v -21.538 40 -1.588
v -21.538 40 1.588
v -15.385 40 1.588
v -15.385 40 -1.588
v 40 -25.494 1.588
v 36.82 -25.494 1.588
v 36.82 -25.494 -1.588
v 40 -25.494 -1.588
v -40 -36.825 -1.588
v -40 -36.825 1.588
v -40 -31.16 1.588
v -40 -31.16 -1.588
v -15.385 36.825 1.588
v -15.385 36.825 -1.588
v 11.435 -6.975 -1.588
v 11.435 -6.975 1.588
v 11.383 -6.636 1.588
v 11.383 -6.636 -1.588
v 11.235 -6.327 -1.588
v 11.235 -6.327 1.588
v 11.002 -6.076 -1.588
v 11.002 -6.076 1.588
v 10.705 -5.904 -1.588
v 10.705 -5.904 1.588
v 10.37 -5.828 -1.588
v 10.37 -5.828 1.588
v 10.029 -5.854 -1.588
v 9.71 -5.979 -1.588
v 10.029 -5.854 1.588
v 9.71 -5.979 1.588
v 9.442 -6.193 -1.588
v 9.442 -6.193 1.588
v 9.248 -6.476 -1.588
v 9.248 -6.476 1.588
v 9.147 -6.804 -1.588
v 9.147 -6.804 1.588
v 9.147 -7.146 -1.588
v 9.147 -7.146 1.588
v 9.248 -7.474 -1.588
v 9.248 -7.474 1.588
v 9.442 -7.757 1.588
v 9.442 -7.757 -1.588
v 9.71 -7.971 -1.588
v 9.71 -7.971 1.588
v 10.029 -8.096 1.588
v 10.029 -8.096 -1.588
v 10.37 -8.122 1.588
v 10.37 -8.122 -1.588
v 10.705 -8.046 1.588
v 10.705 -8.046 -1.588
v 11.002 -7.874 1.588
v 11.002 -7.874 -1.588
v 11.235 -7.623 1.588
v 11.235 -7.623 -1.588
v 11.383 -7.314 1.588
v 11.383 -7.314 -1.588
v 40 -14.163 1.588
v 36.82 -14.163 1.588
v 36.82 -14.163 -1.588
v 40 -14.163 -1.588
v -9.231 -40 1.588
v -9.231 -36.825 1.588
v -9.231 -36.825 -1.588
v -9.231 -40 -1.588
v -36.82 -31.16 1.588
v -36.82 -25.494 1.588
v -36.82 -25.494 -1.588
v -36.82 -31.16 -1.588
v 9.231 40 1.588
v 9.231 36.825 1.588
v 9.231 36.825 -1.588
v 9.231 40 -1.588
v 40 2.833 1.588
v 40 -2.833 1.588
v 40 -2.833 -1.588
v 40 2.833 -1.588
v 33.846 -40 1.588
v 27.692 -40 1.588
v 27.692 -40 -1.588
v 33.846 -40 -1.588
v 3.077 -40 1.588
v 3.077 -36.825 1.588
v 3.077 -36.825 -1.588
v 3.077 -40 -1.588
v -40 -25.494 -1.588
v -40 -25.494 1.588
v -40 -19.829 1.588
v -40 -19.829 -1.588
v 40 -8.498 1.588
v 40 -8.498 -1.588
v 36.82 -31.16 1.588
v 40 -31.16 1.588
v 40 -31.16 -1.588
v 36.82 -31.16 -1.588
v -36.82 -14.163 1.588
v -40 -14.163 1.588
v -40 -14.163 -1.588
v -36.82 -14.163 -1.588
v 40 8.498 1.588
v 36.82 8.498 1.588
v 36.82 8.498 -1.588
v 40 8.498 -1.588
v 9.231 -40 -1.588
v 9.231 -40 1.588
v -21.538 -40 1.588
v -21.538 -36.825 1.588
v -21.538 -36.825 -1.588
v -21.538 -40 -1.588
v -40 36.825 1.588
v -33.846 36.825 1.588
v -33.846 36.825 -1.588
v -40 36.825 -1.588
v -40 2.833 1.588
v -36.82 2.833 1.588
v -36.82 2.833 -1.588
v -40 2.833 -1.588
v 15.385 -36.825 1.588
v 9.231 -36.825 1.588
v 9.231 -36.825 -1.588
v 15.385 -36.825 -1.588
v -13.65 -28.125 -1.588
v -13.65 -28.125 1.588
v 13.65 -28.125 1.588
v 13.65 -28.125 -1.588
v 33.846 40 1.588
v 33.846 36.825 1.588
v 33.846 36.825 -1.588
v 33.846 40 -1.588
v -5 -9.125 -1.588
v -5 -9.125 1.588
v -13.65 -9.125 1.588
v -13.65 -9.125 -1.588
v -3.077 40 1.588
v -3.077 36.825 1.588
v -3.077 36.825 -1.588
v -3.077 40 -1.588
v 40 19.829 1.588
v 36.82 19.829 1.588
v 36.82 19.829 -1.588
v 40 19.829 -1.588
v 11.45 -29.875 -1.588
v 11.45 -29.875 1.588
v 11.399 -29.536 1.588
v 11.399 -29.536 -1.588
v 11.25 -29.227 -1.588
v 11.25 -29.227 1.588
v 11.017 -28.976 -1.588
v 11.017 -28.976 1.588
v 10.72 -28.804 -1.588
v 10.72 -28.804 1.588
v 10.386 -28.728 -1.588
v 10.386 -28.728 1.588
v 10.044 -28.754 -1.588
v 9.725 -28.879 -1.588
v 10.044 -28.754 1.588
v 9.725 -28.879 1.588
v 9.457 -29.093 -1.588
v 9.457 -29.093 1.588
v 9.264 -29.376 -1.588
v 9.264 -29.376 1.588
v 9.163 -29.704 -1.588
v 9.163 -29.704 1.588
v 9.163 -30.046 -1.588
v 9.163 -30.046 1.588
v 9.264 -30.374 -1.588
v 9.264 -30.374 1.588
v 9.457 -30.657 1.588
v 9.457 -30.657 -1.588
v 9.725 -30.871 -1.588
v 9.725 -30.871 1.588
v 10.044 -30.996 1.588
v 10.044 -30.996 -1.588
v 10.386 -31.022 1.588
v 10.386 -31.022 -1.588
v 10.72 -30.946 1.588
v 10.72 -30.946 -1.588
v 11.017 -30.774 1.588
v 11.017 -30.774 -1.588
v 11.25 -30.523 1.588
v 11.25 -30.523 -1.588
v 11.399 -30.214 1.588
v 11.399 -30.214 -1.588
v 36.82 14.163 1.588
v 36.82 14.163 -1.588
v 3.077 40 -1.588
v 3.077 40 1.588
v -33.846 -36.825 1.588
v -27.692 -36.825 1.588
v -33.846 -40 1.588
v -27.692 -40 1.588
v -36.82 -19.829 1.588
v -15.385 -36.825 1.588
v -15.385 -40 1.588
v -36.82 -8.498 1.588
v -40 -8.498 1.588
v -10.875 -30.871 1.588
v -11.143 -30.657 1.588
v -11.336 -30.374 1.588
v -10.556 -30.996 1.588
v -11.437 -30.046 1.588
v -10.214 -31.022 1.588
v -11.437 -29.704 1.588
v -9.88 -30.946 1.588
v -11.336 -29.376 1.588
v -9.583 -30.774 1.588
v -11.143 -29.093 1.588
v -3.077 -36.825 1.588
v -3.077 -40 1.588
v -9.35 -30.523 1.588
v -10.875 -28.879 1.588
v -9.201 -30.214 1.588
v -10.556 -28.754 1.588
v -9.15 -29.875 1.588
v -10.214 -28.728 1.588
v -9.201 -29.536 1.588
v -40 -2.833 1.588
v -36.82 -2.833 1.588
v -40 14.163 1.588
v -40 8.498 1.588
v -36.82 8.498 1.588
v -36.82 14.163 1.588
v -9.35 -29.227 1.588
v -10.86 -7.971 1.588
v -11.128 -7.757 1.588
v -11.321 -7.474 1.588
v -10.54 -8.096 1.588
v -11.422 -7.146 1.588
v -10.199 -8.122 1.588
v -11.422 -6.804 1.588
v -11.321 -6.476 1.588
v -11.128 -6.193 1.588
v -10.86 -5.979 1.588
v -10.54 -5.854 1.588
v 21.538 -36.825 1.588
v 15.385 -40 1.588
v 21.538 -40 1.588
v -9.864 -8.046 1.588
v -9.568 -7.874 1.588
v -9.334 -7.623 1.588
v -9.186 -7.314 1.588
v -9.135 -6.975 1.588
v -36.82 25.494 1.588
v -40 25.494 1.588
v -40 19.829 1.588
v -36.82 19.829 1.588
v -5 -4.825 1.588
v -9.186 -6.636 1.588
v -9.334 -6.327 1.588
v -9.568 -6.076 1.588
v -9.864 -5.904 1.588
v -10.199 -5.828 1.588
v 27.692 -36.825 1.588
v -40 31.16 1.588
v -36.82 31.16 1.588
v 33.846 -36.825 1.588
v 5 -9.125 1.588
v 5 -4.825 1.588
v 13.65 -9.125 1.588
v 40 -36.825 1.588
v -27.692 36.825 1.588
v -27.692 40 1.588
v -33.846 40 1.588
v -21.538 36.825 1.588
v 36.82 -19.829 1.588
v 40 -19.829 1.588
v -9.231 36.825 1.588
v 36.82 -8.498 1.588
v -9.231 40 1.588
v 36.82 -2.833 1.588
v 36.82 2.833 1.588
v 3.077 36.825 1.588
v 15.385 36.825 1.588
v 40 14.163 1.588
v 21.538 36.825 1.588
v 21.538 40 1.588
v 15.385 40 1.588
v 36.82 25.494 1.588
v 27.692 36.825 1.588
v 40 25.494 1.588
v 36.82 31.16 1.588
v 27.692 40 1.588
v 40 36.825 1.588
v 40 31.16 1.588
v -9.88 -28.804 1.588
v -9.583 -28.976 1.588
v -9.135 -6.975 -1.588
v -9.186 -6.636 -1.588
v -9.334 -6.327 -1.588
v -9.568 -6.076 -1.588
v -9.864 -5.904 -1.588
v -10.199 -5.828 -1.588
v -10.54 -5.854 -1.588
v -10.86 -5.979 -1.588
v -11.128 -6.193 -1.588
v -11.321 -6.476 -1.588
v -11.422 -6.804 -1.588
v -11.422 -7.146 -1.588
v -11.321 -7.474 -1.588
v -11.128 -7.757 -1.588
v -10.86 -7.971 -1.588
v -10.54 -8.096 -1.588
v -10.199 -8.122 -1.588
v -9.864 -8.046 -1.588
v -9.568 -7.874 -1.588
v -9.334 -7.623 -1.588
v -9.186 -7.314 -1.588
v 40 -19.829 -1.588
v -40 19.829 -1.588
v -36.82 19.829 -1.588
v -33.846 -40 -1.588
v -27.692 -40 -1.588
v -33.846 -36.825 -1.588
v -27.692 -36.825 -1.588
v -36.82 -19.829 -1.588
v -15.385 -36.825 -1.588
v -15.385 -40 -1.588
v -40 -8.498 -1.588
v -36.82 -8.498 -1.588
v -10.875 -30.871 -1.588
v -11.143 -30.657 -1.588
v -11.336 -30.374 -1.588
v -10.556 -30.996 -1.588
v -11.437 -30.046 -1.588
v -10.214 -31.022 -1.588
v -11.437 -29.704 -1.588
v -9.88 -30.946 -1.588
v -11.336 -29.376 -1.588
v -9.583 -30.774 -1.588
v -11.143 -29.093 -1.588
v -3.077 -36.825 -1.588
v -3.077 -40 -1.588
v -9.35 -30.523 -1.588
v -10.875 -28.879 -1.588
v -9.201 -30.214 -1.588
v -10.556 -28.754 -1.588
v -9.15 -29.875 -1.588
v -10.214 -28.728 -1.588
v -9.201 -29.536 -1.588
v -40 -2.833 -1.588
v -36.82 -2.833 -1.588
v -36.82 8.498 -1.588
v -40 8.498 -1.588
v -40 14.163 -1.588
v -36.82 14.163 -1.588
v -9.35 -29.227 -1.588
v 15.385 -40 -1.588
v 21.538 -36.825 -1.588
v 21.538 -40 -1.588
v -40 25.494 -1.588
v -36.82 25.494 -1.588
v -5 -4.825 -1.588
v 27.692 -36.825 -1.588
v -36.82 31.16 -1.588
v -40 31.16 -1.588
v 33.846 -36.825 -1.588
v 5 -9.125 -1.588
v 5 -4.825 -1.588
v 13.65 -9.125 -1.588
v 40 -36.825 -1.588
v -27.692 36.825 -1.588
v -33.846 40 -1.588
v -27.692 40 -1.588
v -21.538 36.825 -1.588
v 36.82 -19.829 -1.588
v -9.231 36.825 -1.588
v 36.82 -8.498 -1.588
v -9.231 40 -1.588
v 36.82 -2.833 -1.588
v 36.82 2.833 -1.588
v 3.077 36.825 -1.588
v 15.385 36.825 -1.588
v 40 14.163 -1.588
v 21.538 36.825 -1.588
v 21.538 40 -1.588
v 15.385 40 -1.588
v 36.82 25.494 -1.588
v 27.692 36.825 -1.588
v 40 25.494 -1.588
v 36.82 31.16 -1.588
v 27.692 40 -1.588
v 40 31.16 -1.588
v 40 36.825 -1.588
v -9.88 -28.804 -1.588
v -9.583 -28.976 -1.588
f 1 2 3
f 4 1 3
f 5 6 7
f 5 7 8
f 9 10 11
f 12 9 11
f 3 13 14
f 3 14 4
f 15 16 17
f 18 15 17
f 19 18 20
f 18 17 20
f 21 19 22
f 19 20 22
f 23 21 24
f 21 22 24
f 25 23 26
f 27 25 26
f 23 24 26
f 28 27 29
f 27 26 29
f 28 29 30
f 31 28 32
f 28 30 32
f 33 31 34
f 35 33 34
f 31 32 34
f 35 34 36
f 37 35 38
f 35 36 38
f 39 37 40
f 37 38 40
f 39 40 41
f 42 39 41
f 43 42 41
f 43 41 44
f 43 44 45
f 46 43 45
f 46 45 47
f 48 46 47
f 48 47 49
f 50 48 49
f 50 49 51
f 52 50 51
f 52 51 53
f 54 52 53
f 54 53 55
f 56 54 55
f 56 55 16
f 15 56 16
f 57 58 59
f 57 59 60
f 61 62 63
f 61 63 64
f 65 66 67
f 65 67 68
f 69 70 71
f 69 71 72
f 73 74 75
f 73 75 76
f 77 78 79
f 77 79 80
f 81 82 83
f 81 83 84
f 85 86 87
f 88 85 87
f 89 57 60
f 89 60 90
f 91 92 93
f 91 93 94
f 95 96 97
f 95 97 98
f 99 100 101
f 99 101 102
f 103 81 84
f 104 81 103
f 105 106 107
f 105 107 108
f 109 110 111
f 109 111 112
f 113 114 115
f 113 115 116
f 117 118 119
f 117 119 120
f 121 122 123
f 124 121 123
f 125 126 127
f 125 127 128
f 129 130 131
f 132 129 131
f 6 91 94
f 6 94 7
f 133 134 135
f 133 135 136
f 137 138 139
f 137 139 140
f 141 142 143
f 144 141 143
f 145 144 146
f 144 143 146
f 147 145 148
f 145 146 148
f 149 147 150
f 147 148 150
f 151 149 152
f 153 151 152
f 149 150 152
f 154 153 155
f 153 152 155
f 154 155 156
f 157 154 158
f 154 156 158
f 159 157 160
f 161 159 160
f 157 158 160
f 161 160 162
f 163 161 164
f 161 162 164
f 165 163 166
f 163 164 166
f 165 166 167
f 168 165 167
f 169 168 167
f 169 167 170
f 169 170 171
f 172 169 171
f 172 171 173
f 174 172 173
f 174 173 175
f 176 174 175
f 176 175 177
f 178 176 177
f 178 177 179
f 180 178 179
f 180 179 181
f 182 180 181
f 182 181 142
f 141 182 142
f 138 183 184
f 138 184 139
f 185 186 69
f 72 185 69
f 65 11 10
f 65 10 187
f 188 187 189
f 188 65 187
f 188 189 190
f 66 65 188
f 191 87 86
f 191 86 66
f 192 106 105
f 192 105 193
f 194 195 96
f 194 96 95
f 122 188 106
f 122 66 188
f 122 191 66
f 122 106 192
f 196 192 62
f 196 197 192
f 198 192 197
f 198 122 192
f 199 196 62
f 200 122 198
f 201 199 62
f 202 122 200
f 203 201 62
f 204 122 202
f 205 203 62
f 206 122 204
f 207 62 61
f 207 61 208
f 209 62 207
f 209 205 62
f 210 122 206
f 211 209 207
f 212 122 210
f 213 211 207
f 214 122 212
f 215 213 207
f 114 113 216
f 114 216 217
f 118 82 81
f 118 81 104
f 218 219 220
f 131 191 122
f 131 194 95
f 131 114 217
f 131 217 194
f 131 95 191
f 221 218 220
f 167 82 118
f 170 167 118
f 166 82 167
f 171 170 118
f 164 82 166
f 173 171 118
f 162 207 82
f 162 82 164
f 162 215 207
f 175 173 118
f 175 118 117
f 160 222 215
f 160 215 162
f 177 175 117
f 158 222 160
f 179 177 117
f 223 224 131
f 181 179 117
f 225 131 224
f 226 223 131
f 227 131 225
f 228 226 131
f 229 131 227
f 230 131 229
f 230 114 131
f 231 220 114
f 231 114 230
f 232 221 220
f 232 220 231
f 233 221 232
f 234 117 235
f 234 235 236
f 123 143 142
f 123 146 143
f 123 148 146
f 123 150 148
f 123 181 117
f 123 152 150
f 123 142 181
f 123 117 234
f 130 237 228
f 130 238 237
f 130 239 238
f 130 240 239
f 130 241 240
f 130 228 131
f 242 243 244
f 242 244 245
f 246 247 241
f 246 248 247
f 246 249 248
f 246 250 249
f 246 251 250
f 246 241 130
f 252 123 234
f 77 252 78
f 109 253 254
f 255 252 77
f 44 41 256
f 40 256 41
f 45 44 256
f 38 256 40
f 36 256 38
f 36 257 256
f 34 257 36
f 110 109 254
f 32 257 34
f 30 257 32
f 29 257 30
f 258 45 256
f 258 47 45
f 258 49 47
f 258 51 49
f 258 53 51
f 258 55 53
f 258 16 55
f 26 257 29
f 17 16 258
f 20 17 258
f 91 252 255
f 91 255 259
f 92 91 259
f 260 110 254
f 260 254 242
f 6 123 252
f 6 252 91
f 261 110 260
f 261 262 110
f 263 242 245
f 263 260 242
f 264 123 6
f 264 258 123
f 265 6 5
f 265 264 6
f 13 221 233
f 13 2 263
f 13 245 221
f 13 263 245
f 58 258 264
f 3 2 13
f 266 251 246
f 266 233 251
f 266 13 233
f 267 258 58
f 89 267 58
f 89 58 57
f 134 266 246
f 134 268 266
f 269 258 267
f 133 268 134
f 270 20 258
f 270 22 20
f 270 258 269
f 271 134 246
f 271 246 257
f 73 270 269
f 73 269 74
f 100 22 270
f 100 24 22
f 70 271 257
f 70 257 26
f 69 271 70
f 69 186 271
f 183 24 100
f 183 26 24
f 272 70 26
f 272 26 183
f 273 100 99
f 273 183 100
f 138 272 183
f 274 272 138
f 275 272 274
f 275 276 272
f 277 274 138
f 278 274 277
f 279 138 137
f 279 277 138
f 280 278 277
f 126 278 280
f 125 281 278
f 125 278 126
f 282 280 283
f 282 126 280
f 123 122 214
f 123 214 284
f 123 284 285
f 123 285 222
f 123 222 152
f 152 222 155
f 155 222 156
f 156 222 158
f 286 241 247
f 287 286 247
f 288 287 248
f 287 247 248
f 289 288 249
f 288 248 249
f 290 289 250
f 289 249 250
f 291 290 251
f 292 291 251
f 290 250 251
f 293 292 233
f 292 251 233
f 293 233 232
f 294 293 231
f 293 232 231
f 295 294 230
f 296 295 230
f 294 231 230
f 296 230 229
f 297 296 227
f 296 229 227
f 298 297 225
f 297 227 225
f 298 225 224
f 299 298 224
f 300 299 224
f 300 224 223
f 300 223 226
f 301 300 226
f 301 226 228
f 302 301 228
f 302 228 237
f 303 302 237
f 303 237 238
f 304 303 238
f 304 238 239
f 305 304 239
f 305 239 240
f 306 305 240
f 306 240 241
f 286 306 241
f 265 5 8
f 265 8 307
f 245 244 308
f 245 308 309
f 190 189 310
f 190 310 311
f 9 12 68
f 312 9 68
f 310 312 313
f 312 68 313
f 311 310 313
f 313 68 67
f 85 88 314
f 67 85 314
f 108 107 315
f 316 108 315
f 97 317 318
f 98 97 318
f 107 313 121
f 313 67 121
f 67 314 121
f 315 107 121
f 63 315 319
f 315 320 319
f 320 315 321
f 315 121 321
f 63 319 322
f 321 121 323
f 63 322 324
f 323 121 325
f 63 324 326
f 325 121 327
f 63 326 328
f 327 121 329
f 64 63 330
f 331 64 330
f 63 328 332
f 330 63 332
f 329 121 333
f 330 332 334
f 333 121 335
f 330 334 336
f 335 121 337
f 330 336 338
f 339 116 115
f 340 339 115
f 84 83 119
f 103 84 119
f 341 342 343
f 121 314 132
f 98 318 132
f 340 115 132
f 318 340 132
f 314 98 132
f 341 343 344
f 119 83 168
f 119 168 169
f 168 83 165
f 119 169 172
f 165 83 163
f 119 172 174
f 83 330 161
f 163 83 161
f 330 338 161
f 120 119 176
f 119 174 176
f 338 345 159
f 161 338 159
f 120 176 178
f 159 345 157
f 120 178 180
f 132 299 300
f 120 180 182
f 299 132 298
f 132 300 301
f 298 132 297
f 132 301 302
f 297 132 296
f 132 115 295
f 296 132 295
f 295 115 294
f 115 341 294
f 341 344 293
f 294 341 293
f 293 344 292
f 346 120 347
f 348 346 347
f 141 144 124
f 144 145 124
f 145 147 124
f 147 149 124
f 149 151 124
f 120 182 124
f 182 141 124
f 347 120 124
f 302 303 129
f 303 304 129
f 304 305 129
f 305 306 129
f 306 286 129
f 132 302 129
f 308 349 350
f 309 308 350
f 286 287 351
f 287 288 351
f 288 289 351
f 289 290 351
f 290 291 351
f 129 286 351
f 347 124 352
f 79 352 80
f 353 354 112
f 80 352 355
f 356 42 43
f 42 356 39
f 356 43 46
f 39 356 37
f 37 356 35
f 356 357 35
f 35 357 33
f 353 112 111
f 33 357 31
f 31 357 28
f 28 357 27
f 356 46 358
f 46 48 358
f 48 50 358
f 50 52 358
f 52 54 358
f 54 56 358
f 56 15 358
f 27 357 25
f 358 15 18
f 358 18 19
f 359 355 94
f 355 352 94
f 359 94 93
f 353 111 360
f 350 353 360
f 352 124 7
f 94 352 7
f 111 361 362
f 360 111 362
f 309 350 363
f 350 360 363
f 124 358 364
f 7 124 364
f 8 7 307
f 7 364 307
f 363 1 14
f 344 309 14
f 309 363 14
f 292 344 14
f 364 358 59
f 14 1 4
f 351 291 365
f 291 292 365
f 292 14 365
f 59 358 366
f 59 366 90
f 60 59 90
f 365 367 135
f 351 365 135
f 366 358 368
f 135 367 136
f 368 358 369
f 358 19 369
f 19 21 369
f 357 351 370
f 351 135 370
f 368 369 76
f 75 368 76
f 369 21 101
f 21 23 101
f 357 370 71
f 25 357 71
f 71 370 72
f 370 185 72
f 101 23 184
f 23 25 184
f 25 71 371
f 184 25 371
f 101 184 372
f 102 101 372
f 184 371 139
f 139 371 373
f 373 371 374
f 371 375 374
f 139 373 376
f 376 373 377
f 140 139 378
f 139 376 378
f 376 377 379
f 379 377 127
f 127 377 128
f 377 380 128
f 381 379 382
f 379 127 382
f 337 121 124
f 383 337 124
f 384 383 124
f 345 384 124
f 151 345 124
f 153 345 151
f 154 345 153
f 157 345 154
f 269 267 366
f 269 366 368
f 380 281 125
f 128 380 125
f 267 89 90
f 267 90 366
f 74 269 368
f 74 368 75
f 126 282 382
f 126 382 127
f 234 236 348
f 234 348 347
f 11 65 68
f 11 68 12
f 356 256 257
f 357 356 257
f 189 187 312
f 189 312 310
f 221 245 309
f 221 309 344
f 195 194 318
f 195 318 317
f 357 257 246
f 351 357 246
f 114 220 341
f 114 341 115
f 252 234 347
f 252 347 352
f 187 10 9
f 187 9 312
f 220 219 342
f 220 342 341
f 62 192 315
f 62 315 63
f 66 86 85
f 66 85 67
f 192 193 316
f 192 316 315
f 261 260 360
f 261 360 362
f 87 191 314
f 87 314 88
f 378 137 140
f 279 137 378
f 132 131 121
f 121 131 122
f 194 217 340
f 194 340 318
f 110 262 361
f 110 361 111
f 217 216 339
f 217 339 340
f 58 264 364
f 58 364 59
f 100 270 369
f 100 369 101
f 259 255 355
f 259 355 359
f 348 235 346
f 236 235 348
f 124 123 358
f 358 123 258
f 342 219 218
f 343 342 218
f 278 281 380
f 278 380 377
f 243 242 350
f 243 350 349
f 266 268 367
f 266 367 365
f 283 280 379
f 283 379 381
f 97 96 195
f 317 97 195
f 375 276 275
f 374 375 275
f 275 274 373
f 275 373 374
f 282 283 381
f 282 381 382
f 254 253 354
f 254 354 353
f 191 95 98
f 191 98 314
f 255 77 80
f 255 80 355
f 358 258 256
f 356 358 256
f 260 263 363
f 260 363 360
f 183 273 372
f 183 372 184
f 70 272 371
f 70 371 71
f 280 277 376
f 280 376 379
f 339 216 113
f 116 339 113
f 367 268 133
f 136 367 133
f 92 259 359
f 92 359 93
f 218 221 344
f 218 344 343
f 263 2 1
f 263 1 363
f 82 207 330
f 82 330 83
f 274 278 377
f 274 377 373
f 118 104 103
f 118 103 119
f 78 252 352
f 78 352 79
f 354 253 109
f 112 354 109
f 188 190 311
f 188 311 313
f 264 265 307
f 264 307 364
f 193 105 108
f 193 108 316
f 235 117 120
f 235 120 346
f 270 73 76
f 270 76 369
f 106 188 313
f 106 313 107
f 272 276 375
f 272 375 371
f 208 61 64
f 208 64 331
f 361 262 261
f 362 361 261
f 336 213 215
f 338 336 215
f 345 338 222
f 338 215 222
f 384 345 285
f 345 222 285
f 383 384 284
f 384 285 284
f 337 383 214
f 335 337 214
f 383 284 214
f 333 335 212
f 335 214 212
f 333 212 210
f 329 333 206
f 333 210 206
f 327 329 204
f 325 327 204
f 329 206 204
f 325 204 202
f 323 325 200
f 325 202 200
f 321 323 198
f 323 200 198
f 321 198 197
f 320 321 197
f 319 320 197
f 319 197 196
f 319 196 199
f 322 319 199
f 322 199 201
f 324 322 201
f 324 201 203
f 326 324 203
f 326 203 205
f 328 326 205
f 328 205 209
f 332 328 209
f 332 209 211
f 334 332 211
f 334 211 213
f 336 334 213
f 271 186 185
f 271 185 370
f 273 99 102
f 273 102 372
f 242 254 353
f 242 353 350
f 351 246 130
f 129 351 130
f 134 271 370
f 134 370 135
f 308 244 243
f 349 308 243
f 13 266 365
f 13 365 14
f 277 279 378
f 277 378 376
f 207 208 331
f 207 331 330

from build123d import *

# Parameters (mm, degrees)
SKETCH1_W           = 80
SKETCH1_H           = 80
BOSS_EXTRUDE1_DEPTH = 1.5875
SKETCH2_OUTSIDE_W   = 104.636
SKETCH2_OUTSIDE_H   = 104.636
CUT_EXTRUDE2_DEPTH  = 10
SKETCH3_R           = 1.15
CUT_EXTRUDE3_DEPTH  = 57.657573413


with BuildPart() as part:
    # Sketch1 → Boss-Extrude1 (new, symmetric)
    with BuildSketch(Plane.XY):
        Rectangle(SKETCH1_W, SKETCH1_H)
    extrude(amount=BOSS_EXTRUDE1_DEPTH, both=True)

    # Sketch2 outside → Cut-Extrude2 (cut)
    with BuildSketch(Plane.XY.offset(1.5875)):
        Rectangle(SKETCH2_OUTSIDE_W, SKETCH2_OUTSIDE_H)
        Polygon((33.846153846, -36.825), (40, -36.825), (40, -31.159615385), (36.82, -31.159615385), (36.82, -25.494230769), (40, -25.494230769), (40, -19.828846154), (36.82, -19.828846154), (36.82, -14.163461538), (40, -14.163461538), (40, -8.498076923), (36.82, -8.498076923), (36.82, -2.832692308), (40, -2.832692308), (40, 2.832692308), (36.82, 2.832692308), (36.82, 8.498076923), (40, 8.498076923), (40, 14.163461538), (36.82, 14.163461538), (36.82, 19.828846154), (40, 19.828846154), (40, 25.494230769), (36.82, 25.494230769), (36.82, 31.159615385), (40, 31.159615385), (40, 36.825), (33.846153846, 36.825), (33.846153846, 40), (27.692307692, 40), (27.692307692, 36.825), (21.538461538, 36.825), (21.538461538, 40), (15.384615385, 40), (15.384615385, 36.825), (9.230769231, 36.825), (9.230769231, 40), (3.076923077, 40), (3.076923077, 36.825), (-3.076923077, 36.825), (-3.076923077, 40), (-9.230769231, 40), (-9.230769231, 36.825), (-15.384615385, 36.825), (-15.384615385, 40), (-21.538461538, 40), (-21.538461538, 36.825), (-27.692307692, 36.825), (-27.692307692, 40), (-33.846153846, 40), (-33.846153846, 36.825), (-40, 36.825), (-40, 31.159615385), (-36.82, 31.159615385), (-36.82, 25.494230769), (-40, 25.494230769), (-40, 19.828846154), (-36.82, 19.828846154), (-36.82, 14.163461538), (-40, 14.163461538), (-40, 8.498076923), (-36.82, 8.498076923), (-36.82, 2.832692308), (-40, 2.832692308), (-40, -2.832692308), (-36.82, -2.832692308), (-36.82, -8.498076923), (-40, -8.498076923), (-40, -14.163461538), (-36.82, -14.163461538), (-36.82, -19.828846154), (-40, -19.828846154), (-40, -25.494230769), (-36.82, -25.494230769), (-36.82, -31.159615385), (-40, -31.159615385), (-40, -36.825), (-33.846153846, -36.825), (-33.846153846, -40), (-27.692307692, -40), (-27.692307692, -36.825), (-21.538461538, -36.825), (-21.538461538, -40), (-15.384615385, -40), (-15.384615385, -36.825), (-9.230769231, -36.825), (-9.230769231, -40), (-3.076923077, -40), (-3.076923077, -36.825), (3.076923077, -36.825), (3.076923077, -40), (9.230769231, -40), (9.230769231, -36.825), (15.384615385, -36.825), (15.384615385, -40), (21.538461538, -40), (21.538461538, -36.825), (27.692307692, -36.825), (27.692307692, -40), (33.846153846, -40), align=None, mode=Mode.SUBTRACT)
    extrude(amount=-CUT_EXTRUDE2_DEPTH, mode=Mode.SUBTRACT)

    # Sketch3 → Cut-Extrude3 (cut, through all)
    with BuildSketch(Plane.XY.offset(1.5875)):
        Polygon((-13.65, -9.125), (-13.65, -28.125), (13.65, -28.125), (13.65, -9.125), (5, -9.125), (5, -4.825), (-5, -4.825), (-5, -9.125), align=None)
        with Locations((-10.284555817, -6.975)):
            Circle(SKETCH3_R)
        with Locations((10.284555817, -6.975)):
            Circle(SKETCH3_R)
        with Locations((-10.3, -29.875)):
            Circle(SKETCH3_R)
        with Locations((10.3, -29.875)):
            Circle(SKETCH3_R)
    extrude(amount=-CUT_EXTRUDE3_DEPTH, mode=Mode.SUBTRACT)


solid = part.part
